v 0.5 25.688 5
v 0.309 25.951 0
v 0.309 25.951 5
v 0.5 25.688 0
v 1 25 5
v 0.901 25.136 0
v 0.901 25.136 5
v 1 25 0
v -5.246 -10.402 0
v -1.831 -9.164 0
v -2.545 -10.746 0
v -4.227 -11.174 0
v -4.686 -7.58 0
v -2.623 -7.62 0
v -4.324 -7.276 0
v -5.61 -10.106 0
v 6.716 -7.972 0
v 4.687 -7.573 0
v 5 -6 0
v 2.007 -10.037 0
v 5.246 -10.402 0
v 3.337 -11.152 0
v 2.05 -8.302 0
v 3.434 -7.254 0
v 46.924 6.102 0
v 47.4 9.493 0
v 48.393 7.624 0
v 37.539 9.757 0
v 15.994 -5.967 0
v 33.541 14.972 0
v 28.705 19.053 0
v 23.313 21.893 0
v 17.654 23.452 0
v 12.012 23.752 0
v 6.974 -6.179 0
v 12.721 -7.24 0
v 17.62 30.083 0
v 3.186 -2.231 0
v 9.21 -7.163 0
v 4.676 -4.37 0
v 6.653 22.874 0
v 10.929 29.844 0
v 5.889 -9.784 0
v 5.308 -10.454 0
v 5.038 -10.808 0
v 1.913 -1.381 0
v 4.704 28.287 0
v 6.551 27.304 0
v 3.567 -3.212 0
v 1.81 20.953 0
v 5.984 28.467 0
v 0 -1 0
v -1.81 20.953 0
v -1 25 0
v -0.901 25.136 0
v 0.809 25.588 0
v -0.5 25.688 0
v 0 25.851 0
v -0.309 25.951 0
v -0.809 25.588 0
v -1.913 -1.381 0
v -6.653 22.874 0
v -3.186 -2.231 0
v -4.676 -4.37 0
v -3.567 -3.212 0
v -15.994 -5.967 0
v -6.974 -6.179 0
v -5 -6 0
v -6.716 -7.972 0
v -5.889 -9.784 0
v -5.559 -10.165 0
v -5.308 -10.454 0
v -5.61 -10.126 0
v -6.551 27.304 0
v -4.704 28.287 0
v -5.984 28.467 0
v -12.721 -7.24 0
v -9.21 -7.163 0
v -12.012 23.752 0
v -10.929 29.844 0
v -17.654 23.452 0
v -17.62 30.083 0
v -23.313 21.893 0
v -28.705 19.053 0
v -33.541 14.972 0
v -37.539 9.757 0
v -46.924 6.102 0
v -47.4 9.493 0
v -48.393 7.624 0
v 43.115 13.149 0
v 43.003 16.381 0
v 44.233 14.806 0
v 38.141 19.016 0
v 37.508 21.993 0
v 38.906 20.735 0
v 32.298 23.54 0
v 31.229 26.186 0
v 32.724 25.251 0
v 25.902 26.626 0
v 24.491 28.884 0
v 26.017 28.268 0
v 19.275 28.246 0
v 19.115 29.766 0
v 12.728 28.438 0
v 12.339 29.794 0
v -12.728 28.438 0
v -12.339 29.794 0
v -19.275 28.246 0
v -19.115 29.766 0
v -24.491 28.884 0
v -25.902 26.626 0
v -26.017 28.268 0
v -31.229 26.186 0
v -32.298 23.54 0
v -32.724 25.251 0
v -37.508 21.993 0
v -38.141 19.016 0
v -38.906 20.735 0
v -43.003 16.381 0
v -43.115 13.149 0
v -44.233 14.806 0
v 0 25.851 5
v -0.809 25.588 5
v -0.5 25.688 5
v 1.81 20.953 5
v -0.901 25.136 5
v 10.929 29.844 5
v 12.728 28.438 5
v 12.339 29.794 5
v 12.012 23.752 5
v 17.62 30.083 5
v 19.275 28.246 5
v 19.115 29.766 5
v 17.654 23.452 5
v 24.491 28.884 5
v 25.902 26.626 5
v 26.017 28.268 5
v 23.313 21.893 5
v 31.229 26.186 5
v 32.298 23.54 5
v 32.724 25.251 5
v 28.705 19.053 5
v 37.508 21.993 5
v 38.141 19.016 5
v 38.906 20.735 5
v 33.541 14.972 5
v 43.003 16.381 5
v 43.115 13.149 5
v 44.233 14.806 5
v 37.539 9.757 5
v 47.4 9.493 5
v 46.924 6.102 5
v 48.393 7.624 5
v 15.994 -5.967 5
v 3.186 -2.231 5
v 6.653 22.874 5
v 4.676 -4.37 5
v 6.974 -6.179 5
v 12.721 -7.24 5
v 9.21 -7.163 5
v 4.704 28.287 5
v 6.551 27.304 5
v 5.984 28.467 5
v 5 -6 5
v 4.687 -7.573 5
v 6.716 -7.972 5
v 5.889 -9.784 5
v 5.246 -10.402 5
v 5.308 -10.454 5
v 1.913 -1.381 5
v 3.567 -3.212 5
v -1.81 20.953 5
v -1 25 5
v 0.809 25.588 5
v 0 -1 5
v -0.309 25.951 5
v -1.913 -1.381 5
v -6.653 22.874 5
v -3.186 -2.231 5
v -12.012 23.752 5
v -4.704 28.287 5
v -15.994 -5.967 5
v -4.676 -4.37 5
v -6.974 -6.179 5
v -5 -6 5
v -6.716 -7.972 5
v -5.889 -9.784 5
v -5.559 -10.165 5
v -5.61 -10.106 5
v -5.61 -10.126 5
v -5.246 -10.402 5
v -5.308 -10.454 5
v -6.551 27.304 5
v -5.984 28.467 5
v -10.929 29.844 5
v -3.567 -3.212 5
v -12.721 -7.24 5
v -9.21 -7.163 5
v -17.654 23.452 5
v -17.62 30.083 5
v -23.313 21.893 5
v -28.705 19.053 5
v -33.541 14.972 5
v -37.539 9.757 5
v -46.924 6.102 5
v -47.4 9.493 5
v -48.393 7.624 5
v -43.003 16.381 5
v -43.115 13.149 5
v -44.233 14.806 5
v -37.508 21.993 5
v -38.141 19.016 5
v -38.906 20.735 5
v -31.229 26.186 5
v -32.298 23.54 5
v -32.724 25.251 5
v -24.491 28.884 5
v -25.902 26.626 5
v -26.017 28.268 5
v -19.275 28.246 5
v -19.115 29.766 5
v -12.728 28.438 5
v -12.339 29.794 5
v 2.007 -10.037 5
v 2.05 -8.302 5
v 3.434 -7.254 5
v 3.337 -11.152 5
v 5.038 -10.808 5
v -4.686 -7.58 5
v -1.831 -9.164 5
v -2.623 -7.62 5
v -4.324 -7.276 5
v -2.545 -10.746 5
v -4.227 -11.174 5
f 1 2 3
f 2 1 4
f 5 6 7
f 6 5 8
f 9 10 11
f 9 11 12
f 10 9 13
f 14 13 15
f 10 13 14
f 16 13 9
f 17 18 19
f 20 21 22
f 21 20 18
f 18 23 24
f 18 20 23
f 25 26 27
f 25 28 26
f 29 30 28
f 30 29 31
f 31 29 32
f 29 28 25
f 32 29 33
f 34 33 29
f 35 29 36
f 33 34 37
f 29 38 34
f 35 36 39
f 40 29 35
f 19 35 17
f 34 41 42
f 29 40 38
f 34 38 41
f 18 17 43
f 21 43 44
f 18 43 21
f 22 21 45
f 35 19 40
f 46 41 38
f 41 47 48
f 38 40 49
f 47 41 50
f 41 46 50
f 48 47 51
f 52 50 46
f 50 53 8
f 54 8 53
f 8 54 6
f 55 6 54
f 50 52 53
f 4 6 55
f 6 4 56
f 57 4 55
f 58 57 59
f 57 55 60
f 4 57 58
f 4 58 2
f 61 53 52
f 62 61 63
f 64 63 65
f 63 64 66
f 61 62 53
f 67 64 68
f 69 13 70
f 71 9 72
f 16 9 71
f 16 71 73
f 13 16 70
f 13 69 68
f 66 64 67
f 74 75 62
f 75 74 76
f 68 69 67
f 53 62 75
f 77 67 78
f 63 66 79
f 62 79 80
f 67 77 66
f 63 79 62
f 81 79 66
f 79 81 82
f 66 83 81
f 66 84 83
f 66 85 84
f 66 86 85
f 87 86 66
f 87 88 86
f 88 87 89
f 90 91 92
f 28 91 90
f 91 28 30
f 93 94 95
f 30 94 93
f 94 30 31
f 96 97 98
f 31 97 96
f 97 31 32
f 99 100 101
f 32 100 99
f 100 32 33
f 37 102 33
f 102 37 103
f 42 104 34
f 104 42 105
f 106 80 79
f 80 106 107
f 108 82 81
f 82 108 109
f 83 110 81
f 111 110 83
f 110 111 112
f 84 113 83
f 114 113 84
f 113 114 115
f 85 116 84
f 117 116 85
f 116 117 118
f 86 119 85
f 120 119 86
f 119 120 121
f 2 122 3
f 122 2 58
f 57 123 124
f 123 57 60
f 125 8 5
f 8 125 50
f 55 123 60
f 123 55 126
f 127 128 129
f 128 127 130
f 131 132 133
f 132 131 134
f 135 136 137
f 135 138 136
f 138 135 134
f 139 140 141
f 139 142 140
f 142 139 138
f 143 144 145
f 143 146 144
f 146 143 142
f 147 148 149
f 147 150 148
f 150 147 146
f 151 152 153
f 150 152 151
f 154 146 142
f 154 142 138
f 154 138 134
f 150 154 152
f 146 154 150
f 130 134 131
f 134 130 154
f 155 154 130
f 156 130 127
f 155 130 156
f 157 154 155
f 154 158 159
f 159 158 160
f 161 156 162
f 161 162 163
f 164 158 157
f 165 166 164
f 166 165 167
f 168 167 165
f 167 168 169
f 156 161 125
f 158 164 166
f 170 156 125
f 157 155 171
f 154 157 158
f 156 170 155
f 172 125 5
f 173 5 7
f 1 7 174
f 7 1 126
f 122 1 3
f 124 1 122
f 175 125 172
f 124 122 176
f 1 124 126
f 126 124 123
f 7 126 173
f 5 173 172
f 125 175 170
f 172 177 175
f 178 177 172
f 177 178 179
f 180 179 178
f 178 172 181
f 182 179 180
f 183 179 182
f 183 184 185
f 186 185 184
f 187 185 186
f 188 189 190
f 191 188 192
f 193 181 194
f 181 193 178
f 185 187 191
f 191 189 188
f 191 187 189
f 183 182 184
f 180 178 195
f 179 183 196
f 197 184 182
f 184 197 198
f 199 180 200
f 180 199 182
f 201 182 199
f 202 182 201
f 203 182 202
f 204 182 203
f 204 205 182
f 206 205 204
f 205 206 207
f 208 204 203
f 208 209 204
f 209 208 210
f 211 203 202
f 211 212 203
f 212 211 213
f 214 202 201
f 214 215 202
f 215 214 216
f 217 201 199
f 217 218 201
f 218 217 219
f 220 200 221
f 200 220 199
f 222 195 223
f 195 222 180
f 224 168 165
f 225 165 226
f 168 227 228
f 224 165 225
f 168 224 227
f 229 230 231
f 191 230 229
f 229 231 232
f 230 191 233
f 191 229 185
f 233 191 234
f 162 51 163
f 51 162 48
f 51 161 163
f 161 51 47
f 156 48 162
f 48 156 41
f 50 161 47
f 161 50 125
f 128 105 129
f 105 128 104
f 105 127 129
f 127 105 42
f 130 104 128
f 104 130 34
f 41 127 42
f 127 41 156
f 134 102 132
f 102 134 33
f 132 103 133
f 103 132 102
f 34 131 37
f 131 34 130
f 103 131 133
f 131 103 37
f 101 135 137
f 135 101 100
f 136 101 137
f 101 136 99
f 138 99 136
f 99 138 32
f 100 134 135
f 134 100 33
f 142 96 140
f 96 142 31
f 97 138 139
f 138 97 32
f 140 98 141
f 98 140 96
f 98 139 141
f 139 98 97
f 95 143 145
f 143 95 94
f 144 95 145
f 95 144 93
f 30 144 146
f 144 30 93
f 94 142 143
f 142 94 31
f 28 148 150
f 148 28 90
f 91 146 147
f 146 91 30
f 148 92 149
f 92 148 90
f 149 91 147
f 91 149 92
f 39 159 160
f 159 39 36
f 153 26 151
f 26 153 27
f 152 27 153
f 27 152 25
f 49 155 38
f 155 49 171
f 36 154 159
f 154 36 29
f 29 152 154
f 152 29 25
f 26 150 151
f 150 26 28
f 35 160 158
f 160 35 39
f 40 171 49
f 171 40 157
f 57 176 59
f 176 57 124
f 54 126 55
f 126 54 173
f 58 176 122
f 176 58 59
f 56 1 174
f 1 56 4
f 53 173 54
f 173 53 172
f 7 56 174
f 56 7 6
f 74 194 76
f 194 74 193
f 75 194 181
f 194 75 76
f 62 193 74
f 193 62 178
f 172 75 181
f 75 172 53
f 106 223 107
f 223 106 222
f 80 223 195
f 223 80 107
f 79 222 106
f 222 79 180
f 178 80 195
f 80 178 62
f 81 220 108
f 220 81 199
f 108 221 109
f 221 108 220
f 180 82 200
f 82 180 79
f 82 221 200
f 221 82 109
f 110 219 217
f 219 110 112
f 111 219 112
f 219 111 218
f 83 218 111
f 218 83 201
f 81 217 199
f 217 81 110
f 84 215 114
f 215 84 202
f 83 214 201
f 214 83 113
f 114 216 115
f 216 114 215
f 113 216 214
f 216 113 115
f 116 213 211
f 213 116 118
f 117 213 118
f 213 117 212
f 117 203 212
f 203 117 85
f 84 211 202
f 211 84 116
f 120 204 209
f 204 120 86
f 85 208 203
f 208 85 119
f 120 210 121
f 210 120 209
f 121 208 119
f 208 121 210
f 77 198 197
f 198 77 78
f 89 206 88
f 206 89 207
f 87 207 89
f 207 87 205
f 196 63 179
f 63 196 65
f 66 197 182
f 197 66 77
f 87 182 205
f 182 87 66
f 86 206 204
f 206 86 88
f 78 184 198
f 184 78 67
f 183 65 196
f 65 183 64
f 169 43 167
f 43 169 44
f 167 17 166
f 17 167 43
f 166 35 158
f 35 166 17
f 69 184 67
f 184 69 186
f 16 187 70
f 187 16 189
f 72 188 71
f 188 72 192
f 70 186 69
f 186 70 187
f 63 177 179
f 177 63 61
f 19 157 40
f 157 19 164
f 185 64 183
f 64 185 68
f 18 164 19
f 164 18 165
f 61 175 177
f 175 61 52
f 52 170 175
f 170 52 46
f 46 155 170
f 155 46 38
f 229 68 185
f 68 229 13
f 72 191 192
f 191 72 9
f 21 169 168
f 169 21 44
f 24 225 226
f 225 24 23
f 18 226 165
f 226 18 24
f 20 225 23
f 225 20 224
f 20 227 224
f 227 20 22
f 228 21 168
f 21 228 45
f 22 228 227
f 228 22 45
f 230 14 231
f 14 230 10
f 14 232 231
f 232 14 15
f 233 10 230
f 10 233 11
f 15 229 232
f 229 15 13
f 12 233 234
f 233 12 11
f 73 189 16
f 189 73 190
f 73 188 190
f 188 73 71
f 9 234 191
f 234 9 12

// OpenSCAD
// [FL_INDEX: keywords="openscad, 3d_parametric, parametric_moustache, csg_solid" | COT="Parametric OpenSCAD design from 3DCodeverse"]
// Title: parametric moustache

//Displays a 30cm long ruler
showruler = "no"; //["yes","no"]
rulerheight = 2; 
rulerlenght = 300; 

//Pattern-Element parameter 1
circle_1 = 5;//[1:100]
//Pattern-Element parameter 2
circle_2 = 1;//[1:100]
//Pattern-Element parameter 3
lenght = 20;//[1:100]
//Height of the moustache
height = 5;//[1:100]

//How often the element is repeated per side
repeat = 8;//[0:100]
//shift in x direction (10 = 1mm)(elementnumber*x)
shift_x = 2;//[-100:100]
//shift in y direction (10 = 1mm)(elementnumber*y)
shift_y = 5;//[-100:100]
//rotation of elements (elementnumber*rotation)
rotate = 10;//[0:360]
//scale of elements (elementnumber*scale)
scale =1;//[-100:100]


//Noseclip-Parameter: Angle the noseclip is open
noseclip_openingangle = 100;//[0:180]
//Noseclip-Parameter: diameter of the noseclip
noseclip_diameter = 10;//[0:180]
//Noseclip-Parameter: wallthickness of the noseclip
noseclip_wallthickness = 2;//[0:180]
//Noseclip-Parameter: radius of the little circles at the end of the noseclip
noseclip_endcircle = 2;//[0:180]
//Noseclip-Parameter: shift in x direction
noseclip_x = 0;//[-100:100]
//Noseclip-Parameter: shift in y direction
noseclip_y = -6;//[-100:100]

realshift_x = shift_x/10;
realshift_y = shift_y/10;
realscale = scale/10;





if(showruler == "yes"){
	ruler();
}
full(circle_1,circle_2,lenght,height);
noseclip();


module ruler(){
	translate([0,-noseclip_diameter,rulerheight + height]){
		difference(){
			cube([rulerlenght,10,rulerheight], center = true);
			for(i=[0:30]){
				translate([(i*10)-150,0,0]){
					cube([1,5,rulerheight+2], center = true);
				}
			}
		}
	}
}


module noseclip(){
translate([noseclip_x,noseclip_y,height/2]){
	difference(){
		union(){
			cylinder(h = height, r = noseclip_diameter/2+noseclip_wallthickness, center = true);
			
		}
		cylinder(h = height+2, r = noseclip_diameter/2, center = true);	
		rotate(180+90 + noseclip_openingangle/2) 
			linear_extrude(height = height+2, center = true)
				slice(noseclip_diameter*2, noseclip_openingangle);
	}
rotate(noseclip_openingangle/2) 
	translate([0,-noseclip_diameter/2,0]){
		cylinder(h = height, r = noseclip_endcircle, center = true);
	}

rotate(-noseclip_openingangle/2) 
	translate([0,-noseclip_diameter/2,0]){
		cylinder(h = height, r = noseclip_endcircle, center = true);
	}
}
}


module slice(r = 10, deg = 30) { 
	degn = (deg % 360 > 0) ? deg % 360 : deg % 360 + 360;
	difference() {
		circle(r);
		if (degn > 180) 
			intersection_for(a = [0, 180 - degn]) 
				rotate(a) 
					translate([-r, 0, 0]) 
						square(r * 2); 
		else 
			union() 
				for(a = [0, 180 - degn]) 
					rotate(a) 
						translate([-r, 0, 0]) 
							square(r * 2); 
	}
}

module full() {
	half(circle_1,circle_2,lenght,height);
	mirror([ 1, 0, 0 ])
		half(circle_1,circle_2,lenght,height);
}



module half() {
	for(i=[0:repeat]){
		translate([i*realshift_x,i* realshift_y, 0]){
			rotate([0,0,i*-rotate]){
				translate([-circle_1,0,0]){
					scale(v = [(i*realscale)+1,(i*realscale)+1, 1])
						element(circle_1,circle_2,lenght,height);
				}
			}
		}
	}
}


module element(circle_1,circle_2,lenght,height) {
 linear_extrude(height=height)
 	hull() {
 		translate([circle_1, circle_1, 0])
 			circle(r=circle_1,center = true);
 		translate([circle_1 ,  circle_1+ lenght, 0])
 			circle(r=circle_2,center = true);
 	}
}
